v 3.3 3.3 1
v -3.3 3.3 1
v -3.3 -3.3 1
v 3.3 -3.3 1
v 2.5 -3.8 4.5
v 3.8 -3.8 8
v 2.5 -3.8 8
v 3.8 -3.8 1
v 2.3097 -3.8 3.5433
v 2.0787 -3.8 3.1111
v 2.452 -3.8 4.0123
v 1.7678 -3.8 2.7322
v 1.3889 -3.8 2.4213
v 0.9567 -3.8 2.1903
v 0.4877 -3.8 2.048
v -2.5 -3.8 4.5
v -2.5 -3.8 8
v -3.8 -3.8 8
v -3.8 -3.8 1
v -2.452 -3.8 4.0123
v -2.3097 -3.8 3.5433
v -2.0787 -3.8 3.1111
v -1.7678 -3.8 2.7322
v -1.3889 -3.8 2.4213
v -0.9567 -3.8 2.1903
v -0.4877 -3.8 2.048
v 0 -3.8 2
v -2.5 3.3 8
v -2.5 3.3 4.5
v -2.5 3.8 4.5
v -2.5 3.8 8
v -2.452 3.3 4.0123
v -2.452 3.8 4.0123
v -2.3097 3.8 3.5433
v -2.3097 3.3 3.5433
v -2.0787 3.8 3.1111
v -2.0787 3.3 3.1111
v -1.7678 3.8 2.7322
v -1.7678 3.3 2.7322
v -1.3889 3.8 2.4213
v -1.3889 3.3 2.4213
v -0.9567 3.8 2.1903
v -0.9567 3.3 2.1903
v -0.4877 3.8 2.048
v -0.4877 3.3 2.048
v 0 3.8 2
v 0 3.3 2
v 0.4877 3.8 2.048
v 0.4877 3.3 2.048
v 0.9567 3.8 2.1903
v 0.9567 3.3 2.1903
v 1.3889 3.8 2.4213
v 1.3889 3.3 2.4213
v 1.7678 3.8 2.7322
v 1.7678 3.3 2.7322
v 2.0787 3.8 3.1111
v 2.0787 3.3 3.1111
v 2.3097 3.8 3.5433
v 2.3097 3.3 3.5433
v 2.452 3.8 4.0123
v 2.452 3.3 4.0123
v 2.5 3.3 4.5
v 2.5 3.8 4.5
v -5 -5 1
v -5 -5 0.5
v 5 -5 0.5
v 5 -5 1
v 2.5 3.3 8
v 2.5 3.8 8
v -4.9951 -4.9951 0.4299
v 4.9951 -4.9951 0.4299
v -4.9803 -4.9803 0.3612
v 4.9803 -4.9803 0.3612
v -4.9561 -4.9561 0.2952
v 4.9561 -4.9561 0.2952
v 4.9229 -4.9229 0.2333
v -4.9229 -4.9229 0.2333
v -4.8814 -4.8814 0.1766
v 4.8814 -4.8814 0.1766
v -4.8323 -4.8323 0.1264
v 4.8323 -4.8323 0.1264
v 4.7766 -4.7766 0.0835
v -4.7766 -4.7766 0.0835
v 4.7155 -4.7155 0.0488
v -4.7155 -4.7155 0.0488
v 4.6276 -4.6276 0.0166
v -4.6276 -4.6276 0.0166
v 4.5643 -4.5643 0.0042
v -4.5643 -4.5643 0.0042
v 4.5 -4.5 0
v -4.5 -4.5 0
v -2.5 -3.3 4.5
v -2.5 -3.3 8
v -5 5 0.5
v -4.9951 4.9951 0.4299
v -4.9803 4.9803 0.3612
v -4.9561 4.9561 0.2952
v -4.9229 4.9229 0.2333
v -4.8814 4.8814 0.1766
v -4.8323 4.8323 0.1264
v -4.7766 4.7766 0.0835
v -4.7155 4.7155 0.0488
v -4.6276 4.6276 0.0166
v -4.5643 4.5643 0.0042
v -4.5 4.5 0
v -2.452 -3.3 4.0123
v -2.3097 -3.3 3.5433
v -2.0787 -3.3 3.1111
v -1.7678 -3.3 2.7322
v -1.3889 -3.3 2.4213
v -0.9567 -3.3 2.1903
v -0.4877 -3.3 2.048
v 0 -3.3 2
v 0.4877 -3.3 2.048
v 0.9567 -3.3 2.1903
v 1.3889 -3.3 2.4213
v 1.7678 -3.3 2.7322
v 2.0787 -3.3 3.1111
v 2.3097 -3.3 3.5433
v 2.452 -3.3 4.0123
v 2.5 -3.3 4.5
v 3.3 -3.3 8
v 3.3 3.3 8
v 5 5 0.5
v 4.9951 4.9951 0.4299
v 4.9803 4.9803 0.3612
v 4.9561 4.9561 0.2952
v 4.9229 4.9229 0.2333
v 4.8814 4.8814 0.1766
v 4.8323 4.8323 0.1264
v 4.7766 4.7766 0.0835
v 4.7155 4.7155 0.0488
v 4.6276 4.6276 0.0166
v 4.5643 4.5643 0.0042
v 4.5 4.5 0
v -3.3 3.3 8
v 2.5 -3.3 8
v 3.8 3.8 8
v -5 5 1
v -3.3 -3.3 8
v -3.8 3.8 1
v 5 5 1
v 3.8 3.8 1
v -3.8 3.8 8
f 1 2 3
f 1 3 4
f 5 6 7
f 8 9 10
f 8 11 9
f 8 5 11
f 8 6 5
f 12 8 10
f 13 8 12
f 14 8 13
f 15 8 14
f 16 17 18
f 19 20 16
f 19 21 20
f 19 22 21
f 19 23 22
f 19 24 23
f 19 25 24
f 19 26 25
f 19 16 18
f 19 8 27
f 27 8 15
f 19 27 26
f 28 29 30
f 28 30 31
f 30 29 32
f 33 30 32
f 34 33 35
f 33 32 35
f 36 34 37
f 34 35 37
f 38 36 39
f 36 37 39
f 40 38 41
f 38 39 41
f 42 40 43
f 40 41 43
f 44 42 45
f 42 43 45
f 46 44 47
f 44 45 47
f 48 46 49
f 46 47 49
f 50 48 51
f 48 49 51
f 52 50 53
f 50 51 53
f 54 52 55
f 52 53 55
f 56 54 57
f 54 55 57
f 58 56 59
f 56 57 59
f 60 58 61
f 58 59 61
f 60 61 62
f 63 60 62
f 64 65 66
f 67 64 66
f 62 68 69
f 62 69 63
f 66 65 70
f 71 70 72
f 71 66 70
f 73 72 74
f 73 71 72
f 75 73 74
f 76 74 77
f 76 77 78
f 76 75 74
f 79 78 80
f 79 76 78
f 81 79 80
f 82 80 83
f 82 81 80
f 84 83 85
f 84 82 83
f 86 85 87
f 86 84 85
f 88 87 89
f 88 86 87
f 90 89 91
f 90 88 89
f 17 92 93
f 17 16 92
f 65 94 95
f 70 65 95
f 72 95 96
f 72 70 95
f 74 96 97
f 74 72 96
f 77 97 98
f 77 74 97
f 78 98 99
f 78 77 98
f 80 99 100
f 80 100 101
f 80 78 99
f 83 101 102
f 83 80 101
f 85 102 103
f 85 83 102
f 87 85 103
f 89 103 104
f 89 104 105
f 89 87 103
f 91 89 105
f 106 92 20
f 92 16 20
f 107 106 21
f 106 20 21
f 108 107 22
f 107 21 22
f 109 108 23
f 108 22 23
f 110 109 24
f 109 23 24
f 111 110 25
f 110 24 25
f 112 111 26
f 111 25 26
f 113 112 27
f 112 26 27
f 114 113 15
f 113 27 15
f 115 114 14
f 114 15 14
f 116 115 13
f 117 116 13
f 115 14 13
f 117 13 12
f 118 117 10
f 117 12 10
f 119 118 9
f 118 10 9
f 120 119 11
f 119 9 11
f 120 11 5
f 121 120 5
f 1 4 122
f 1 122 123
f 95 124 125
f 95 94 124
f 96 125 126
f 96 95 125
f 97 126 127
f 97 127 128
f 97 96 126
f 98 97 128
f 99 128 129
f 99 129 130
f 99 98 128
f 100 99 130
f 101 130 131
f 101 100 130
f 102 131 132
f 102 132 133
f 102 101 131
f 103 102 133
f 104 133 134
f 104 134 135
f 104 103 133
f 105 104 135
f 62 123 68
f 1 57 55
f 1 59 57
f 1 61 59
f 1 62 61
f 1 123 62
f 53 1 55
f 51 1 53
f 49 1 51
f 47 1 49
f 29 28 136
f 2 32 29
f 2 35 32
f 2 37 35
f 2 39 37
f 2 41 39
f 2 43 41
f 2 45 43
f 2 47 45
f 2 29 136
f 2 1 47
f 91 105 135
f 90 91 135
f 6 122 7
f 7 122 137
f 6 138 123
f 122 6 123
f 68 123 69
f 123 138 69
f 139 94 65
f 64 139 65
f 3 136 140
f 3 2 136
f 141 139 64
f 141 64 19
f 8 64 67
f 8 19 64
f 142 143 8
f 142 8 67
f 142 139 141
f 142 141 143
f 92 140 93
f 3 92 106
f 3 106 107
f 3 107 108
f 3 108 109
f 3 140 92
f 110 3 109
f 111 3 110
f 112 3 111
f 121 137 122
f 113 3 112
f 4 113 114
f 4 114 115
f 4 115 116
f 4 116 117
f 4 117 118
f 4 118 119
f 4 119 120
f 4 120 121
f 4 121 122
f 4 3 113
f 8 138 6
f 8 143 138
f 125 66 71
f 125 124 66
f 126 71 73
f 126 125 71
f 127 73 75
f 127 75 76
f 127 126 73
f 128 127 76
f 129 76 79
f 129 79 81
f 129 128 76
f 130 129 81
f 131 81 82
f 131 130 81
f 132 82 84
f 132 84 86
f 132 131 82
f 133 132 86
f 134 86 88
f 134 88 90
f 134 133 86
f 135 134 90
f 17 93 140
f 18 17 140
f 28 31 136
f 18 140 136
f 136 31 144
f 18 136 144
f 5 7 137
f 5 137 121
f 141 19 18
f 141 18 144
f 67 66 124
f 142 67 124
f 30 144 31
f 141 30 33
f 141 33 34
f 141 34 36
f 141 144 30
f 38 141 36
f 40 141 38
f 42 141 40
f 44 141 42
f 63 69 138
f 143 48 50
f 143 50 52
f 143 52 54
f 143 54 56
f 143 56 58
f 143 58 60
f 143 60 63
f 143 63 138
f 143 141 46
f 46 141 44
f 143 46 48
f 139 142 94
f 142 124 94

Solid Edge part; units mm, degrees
sketch "Sketch1" plane through (0, 0, 0) normal (0, 0, 1) x (1, 0, 0)
  line L0 (5, -5) -> (5, 5)
  line L1 (5, 5) -> (-5, 5)
  line L2 (-5, 5) -> (-5, -5)
  line L3 (-5, -5) -> (5, -5)
extrude "Protrusion1" add sketch "Sketch1" along normal blind 1
sketch "Sketch2" plane through (0, 0, 1) normal (0, 0, 1) x (1, 0, 0)
  line L0 (-3.3, -3.3) -> (3.3, -3.3)
  line L1 (3.3, -3.3) -> (3.3, 3.3)
  line L2 (3.3, 3.3) -> (-3.3, 3.3)
  line L3 (-3.3, 3.3) -> (-3.3, -3.3)
  line L4 (3.8, -3.8) -> (-3.8, -3.8)
  line L5 (-3.8, -3.8) -> (-3.8, 3.8)
  line L6 (-3.8, 3.8) -> (3.8, 3.8)
  line L7 (3.8, 3.8) -> (3.8, -3.8)
extrude "ExtrudedProtrusion_2" add sketch "Sketch2" along normal blind 7
sketch "Sketch3" plane through (0, -3.8, 4.5) normal (0, -1, 0) x (1, 0, 0)
  line L0 (2.5, 3.5) -> (2.5, 0)
  arc A0 (-2.5, 0) -> (2.5, 0) centre (0, 0) ccw
  line L1 (-2.5, 0) -> (-2.5, 3.5)
  line L2 (-2.5, 3.5) -> (2.5, 3.5)
extrude "ExtrudedCutout_1" cut sketch "Sketch3" against normal blind 9.3
fillet "Round_1" radius 0.5 4 edges at (0, -5, 0) (5, 0, 0) (0, 5, 0) (-5, 0, 0)
properties material "ABS Plastic, high impact"
